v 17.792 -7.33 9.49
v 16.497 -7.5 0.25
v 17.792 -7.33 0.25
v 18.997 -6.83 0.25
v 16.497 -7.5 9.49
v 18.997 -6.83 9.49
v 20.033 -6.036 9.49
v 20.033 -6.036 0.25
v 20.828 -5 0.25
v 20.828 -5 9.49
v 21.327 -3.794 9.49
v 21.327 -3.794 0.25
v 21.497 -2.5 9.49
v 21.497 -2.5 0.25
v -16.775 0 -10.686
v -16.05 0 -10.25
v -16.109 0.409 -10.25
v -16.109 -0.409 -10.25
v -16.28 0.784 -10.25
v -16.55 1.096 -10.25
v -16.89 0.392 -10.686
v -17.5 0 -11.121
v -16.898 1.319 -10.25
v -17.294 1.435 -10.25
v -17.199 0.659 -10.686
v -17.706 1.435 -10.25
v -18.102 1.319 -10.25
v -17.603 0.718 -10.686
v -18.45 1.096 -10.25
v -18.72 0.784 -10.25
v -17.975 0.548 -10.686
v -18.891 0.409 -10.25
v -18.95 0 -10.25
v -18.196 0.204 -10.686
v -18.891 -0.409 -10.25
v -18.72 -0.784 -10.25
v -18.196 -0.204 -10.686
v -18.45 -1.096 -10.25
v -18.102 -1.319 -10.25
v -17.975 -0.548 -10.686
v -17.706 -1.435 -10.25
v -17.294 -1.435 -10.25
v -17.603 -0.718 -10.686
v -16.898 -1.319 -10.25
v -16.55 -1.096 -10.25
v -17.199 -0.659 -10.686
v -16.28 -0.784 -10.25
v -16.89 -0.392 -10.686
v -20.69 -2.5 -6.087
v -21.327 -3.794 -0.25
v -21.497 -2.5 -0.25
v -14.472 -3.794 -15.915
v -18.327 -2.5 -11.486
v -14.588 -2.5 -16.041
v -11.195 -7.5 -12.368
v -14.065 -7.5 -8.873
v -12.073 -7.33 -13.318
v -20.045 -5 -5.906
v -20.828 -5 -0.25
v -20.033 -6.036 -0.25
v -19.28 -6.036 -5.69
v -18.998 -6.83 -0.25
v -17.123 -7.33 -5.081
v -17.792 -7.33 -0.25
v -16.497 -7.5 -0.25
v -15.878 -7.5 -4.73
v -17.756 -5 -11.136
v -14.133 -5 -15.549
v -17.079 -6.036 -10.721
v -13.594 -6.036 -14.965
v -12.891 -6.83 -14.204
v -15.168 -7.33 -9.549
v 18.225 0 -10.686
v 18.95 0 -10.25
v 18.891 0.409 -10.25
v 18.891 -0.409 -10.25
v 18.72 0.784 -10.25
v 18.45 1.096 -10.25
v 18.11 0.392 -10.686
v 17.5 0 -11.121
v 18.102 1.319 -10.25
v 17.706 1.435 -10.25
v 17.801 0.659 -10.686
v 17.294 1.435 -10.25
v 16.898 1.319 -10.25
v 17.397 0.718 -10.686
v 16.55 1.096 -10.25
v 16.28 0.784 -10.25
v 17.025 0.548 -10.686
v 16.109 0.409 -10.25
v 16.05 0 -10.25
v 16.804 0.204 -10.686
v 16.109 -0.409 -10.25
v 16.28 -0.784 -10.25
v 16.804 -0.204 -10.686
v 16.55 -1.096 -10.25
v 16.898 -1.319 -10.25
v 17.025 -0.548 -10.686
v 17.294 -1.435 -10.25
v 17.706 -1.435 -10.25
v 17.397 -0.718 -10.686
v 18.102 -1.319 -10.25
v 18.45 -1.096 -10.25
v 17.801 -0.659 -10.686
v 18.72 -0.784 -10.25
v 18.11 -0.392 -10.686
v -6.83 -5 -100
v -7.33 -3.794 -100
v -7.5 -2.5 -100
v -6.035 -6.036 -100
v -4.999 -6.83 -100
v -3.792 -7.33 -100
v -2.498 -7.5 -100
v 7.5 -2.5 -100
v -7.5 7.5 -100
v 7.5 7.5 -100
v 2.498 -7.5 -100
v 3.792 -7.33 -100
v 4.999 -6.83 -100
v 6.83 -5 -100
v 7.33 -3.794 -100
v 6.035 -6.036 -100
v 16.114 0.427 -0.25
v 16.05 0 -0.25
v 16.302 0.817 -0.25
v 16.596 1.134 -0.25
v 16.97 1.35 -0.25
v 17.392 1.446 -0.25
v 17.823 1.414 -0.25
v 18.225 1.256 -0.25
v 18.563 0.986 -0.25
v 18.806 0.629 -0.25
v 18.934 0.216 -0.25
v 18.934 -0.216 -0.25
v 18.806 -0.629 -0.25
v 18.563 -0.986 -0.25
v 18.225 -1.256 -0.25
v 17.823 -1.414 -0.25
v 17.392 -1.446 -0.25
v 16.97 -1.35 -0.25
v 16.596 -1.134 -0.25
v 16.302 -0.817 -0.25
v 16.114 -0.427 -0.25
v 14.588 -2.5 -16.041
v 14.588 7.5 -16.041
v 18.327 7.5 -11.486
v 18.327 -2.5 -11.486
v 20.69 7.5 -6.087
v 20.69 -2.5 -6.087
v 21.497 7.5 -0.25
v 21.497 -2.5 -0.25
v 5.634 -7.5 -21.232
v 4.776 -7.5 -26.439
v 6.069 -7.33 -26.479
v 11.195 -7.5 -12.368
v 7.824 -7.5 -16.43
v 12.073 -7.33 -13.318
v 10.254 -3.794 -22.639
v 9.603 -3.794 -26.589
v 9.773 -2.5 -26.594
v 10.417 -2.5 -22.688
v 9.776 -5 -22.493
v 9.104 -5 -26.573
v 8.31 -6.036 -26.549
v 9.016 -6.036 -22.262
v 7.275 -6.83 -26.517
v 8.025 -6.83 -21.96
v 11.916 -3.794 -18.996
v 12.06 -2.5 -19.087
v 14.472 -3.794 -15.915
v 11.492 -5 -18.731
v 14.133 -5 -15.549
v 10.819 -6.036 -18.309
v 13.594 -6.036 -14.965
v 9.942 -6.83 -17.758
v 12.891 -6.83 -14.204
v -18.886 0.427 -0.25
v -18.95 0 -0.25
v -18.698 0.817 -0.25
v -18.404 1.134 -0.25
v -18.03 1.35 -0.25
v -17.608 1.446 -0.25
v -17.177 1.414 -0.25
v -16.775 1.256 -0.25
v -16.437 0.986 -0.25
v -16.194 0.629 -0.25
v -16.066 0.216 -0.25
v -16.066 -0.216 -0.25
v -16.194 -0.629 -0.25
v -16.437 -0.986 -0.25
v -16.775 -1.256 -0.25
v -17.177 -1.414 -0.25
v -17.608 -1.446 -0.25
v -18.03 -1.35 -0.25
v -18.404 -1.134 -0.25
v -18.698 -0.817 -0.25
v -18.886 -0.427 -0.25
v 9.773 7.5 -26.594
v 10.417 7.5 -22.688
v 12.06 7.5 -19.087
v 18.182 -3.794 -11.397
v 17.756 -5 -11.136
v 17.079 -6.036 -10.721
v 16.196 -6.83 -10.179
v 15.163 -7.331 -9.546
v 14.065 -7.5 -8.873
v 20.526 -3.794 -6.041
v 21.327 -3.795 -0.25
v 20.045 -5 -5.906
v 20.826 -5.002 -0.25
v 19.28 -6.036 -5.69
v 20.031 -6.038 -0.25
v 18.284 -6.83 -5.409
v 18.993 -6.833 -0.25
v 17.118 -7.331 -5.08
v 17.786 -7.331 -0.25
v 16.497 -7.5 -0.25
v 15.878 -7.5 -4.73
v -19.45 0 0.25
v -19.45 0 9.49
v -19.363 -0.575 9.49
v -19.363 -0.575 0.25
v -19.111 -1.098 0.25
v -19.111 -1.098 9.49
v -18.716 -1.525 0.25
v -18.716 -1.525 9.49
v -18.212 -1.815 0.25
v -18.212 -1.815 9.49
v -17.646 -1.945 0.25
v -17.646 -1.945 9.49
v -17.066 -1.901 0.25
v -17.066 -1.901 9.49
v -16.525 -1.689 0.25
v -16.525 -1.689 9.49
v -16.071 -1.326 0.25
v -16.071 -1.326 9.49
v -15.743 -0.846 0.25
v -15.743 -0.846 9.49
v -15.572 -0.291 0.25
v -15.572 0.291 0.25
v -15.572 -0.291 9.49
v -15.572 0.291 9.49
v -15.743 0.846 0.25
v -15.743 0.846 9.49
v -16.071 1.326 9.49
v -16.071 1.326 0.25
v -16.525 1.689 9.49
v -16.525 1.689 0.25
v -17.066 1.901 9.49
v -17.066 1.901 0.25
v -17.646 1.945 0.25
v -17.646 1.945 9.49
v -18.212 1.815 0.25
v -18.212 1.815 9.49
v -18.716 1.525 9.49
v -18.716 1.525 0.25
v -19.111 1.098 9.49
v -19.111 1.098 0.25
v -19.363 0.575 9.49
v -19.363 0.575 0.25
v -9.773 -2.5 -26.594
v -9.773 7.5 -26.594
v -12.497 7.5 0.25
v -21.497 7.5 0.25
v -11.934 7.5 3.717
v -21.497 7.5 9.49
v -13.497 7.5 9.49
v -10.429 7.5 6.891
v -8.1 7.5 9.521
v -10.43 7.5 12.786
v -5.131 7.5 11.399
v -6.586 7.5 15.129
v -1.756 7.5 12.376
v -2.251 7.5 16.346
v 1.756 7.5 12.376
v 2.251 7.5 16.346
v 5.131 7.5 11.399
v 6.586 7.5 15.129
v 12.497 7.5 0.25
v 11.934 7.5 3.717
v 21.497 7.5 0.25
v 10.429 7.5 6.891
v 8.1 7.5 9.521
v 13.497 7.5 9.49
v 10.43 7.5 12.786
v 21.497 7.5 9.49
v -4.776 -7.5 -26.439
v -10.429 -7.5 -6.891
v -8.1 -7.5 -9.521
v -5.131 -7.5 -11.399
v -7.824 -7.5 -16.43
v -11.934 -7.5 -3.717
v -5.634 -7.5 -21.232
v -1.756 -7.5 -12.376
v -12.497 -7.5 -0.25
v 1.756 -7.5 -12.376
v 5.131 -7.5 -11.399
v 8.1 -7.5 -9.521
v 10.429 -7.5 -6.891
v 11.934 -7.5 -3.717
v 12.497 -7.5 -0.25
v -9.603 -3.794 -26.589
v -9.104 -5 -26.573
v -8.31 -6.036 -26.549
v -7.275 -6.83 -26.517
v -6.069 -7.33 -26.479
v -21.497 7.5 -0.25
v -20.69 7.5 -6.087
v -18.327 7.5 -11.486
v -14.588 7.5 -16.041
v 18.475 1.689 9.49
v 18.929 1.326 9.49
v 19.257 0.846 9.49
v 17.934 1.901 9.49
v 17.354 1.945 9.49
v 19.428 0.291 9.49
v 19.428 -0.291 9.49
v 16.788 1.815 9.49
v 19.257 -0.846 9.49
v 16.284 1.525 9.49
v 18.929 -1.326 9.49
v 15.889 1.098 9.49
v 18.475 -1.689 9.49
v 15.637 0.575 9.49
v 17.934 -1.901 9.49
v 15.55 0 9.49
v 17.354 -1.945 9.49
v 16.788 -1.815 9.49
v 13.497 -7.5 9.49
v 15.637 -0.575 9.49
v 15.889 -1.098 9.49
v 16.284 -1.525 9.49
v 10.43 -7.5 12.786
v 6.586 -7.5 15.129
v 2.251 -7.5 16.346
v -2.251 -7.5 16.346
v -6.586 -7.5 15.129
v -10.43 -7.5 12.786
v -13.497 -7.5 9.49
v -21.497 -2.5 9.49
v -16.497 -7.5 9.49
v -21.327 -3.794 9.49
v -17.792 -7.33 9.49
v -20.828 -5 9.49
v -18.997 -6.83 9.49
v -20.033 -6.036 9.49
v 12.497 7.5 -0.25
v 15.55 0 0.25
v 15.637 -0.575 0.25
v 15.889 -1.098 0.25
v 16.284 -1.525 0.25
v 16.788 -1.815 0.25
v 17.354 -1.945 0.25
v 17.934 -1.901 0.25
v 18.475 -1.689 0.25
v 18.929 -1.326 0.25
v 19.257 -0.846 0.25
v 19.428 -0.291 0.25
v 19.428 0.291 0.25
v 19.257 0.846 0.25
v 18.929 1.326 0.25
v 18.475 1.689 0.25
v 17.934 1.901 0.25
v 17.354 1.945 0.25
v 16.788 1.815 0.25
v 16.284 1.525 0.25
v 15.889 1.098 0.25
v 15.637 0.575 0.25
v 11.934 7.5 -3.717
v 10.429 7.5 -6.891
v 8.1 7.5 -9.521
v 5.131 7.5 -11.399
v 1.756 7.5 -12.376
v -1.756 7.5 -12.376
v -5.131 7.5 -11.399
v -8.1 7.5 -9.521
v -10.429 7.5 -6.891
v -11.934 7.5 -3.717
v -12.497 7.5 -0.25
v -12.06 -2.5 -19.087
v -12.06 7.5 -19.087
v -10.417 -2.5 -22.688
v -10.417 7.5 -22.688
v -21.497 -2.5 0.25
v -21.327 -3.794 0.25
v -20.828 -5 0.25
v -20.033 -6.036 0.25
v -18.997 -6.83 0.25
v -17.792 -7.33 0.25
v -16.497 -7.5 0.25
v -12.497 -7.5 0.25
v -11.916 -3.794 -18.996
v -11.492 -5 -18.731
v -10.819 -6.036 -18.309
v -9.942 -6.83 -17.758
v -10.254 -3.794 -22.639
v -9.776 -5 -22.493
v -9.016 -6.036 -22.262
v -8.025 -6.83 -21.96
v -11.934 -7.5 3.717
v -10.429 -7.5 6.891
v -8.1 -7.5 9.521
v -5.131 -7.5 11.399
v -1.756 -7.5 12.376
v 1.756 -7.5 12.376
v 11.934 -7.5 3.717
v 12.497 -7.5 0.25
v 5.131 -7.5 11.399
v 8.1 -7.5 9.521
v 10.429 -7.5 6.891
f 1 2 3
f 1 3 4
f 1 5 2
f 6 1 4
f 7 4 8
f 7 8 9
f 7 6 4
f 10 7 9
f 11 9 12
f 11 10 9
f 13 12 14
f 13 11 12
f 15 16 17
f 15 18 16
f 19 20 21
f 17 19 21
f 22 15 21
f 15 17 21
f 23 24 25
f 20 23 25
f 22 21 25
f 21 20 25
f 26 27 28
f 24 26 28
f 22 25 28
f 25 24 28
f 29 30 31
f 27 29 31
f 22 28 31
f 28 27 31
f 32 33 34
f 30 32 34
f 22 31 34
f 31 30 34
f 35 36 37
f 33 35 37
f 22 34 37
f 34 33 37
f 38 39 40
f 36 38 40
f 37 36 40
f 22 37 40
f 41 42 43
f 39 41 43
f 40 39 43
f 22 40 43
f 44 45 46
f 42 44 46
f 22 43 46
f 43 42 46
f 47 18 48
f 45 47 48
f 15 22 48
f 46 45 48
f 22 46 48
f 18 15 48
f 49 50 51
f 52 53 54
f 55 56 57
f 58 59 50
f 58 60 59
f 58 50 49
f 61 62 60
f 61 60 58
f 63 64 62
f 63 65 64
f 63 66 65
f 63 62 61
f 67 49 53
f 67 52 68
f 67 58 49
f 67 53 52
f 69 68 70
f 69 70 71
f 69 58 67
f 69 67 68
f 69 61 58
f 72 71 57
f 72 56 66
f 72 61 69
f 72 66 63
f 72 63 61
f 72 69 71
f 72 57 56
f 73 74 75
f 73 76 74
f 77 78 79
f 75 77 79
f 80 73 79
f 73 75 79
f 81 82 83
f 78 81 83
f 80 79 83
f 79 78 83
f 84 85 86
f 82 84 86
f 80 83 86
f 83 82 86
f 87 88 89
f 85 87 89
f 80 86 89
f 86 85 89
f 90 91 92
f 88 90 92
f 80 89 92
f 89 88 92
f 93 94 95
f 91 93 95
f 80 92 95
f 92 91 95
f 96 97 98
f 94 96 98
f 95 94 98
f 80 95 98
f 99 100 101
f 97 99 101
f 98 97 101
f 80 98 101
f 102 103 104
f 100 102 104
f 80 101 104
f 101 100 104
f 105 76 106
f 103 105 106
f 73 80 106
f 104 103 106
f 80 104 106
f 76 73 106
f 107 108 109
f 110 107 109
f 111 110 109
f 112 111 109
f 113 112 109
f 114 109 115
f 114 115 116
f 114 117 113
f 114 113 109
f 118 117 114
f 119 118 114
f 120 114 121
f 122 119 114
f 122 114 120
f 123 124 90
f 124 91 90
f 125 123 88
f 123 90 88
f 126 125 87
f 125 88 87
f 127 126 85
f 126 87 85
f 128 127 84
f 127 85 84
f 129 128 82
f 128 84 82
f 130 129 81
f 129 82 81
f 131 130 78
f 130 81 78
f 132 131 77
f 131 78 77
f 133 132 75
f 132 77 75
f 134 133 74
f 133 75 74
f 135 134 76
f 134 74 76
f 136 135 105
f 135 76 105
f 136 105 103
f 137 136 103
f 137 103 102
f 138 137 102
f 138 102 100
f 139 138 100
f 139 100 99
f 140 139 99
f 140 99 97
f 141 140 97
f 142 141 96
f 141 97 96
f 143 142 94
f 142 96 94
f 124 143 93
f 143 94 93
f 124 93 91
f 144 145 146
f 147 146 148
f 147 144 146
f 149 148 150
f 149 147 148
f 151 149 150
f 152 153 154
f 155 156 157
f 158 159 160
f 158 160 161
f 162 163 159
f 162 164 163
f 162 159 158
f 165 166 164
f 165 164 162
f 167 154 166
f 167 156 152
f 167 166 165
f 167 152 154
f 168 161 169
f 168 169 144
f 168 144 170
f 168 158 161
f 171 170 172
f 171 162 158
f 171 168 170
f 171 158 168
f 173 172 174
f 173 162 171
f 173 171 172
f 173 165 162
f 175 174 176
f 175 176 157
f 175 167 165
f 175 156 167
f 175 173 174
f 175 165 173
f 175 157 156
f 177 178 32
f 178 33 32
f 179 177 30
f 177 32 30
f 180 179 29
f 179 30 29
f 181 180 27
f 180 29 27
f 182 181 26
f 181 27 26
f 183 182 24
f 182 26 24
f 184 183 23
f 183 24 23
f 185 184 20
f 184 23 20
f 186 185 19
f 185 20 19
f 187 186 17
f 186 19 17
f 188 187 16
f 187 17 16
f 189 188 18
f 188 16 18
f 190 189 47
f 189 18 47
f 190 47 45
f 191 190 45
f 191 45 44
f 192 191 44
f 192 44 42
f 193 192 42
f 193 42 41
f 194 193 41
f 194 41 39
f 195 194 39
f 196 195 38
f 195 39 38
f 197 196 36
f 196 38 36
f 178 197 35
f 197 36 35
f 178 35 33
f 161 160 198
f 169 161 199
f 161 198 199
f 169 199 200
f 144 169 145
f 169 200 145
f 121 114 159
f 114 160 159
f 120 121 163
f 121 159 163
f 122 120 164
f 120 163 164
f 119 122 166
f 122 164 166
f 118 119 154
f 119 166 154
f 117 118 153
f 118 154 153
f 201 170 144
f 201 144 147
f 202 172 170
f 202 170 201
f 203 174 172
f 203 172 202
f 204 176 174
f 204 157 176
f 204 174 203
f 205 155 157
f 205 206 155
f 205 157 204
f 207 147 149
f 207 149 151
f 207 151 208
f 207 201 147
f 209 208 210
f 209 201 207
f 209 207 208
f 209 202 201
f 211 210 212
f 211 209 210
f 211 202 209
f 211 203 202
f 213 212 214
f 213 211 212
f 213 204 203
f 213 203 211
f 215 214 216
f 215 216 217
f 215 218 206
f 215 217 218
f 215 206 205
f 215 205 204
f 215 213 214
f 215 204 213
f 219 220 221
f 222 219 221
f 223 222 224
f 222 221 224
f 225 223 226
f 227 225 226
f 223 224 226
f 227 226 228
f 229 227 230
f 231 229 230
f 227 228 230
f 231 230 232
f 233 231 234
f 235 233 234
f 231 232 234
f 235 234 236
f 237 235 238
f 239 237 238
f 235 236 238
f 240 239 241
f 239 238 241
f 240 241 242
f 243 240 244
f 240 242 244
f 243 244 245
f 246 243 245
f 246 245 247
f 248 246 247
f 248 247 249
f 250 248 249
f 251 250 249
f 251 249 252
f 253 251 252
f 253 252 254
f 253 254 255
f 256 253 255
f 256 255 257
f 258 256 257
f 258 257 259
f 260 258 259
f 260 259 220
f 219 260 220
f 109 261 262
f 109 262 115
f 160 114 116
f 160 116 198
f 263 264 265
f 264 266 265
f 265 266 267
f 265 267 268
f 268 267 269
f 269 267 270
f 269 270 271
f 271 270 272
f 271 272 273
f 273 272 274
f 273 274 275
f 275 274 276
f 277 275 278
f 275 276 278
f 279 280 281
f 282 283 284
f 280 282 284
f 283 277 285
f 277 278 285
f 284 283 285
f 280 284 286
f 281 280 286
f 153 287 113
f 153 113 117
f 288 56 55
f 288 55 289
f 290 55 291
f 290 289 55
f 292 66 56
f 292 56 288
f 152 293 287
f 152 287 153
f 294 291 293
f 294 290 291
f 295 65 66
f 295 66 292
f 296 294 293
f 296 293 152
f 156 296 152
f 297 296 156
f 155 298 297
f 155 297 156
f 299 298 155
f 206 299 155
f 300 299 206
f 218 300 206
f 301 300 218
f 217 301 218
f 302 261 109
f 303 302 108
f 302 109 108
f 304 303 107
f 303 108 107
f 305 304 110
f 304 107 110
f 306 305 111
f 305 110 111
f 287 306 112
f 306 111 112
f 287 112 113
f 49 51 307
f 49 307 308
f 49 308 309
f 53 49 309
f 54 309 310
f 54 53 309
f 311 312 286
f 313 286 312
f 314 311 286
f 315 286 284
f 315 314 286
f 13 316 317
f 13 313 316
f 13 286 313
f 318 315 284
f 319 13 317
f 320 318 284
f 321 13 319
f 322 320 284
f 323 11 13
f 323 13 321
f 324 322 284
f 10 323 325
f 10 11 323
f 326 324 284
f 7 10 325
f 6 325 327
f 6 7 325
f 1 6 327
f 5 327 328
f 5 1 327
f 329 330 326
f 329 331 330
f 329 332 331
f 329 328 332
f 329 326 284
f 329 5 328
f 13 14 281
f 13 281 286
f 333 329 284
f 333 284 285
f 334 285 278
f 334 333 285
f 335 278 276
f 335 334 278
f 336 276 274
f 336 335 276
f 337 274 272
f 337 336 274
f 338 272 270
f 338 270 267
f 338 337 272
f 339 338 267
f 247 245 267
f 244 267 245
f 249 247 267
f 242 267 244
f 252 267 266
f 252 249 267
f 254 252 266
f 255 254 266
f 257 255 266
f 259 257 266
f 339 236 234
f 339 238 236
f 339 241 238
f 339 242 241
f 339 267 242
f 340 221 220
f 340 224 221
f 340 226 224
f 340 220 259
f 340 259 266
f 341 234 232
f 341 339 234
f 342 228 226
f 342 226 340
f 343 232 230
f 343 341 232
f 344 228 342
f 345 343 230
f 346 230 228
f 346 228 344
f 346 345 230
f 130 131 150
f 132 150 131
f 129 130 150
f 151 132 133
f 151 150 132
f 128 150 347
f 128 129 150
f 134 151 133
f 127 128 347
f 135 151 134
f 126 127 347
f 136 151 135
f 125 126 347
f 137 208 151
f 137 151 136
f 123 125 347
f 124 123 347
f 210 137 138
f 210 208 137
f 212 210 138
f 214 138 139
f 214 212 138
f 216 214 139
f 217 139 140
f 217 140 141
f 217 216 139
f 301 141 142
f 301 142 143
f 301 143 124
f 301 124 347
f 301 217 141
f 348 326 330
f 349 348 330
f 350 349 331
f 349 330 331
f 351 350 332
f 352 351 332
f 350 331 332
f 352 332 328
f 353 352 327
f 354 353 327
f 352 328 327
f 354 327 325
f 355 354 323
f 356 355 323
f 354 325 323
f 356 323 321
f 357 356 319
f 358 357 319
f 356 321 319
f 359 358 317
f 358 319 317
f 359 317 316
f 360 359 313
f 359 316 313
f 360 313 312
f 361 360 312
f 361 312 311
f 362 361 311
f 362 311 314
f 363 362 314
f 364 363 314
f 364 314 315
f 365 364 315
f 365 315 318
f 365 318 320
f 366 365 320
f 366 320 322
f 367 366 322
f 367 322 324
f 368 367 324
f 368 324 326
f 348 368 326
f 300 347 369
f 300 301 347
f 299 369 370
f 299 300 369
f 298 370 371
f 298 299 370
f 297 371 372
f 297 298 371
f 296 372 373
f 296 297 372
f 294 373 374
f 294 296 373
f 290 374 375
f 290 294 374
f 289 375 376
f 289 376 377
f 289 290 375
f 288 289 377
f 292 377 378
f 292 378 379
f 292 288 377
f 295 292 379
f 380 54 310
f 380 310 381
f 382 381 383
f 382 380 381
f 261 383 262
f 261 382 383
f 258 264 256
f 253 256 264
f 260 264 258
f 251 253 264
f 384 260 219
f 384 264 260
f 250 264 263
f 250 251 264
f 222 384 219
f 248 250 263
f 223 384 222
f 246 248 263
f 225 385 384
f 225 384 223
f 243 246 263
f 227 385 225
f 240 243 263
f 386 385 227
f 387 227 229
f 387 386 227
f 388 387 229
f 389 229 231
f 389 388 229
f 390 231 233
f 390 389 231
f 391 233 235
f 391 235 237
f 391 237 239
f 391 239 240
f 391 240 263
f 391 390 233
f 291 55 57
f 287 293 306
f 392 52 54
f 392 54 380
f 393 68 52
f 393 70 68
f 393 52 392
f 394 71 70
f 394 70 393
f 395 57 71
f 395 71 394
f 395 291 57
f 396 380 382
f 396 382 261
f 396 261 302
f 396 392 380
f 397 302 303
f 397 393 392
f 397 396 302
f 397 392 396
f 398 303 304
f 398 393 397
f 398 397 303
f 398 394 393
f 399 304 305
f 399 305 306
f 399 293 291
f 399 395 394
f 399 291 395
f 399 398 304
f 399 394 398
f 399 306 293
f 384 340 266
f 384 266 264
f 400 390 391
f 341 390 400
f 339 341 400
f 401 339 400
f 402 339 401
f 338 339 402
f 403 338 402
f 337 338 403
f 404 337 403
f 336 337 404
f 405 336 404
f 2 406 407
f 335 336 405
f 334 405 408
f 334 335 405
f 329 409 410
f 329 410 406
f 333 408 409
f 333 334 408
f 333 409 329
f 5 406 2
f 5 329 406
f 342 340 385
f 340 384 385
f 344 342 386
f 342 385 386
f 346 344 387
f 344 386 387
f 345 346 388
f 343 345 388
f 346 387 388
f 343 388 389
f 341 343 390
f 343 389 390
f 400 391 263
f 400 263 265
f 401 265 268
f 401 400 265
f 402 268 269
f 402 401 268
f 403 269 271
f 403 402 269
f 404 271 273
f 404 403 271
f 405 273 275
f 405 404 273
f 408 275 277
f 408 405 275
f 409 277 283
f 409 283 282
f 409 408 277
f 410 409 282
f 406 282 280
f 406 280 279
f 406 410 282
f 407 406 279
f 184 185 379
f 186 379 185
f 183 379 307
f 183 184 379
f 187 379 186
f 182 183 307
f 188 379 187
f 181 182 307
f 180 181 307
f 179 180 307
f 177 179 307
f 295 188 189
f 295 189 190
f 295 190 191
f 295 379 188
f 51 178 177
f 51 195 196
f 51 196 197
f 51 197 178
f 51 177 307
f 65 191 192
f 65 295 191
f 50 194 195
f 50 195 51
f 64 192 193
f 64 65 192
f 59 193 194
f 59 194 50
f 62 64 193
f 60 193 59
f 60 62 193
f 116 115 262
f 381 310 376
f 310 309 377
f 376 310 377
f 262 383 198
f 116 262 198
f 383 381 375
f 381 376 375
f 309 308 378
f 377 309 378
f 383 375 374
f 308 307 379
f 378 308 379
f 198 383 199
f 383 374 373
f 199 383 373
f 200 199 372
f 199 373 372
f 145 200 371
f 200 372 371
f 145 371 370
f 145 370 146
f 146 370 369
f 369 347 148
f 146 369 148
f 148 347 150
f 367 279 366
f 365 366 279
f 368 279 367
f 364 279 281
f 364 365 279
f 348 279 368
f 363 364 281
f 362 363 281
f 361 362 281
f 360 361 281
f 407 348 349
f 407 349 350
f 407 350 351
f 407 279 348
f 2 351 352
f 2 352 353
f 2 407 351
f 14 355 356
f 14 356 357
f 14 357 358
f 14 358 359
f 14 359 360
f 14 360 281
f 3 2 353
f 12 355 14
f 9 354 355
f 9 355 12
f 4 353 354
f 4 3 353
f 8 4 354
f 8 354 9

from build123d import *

# Parameters (mm, degrees)
F1_DEPTH = 7.5
F3_D     = 2.9
F3_DEPTH = 10
F3_TIP   = 0.8712478976
F4_R     = 15
F5_R     = 5
F7_DEPTH = 7.5
F8_D     = 3.9
F9_R     = 5


with BuildPart() as f1:
    # F0 (on Front) → F1 (new body, symmetric)
    with BuildSketch(Plane.XZ):
        with BuildLine():
            ThreePointArc((12.4974997499, -0.25), (0, -12.5), (-12.4974997499, -0.25))
            Line((-12.4974997499, -0.25), (-21.4974997499, -0.25))
            ThreePointArc((-21.4974997499, -0.25), (-18.3999659374, -11.3668227925), (-10, -19.2800419206))
            Line((-10, -19.2800419206), (-7.5, -100))
            Line((-7.5, -100), (7.5, -100))
            Line((7.5, -100), (10, -19.2800419206))
            ThreePointArc((10, -19.2800419206), (18.3999659374, -11.3668227925), (21.4974997499, -0.25))
            Line((21.4974997499, -0.25), (12.4974997499, -0.25))
        make_face()
    extrude(amount=F1_DEPTH, both=True)

    # F3
    with Locations(Plane.XY.offset(-0.25)):
        with Locations((-17.5, 0), (17.5, 0)):
            Hole(F3_D / 2, depth=F3_DEPTH)
            with Locations((0, 0, -(F3_DEPTH + F3_TIP / 2))):  # 118° drill point
                Cone(0, F3_D / 2, F3_TIP, mode=Mode.SUBTRACT)

    # F4
    f4_edges = [f1.edges().sort_by_distance(p)[0] for p in [
        (-10, 0, -19.280042),
        (10, 0, -19.280042),
    ]]
    fillet(f4_edges, radius=F4_R)

    # F5
    f5_edges = [f1.edges().sort_by_distance(p)[0] for p in [
        (-8.636735, -7.5, -63.297106),
        (8.636735, -7.5, -63.297106),
    ]]
    fillet(f5_edges, radius=F5_R)


with BuildPart() as f7:
    # F6 (on Front) → F7 (new body, symmetric)
    with BuildSketch(Plane.XZ):
        with BuildLine():
            Line((-21.4974997499, 0.25), (-12.4974997499, 0.25))
            ThreePointArc((-12.4974997499, 0.25), (0, 12.5), (12.4974997499, 0.25))
            Line((12.4974997499, 0.25), (21.4974997499, 0.25))
            Line((21.4974997499, 0.25), (21.4974997499, 9.4903899024))
            Line((21.4974997499, 9.4903899024), (13.4974997499, 9.4903899024))
            ThreePointArc((13.4974997499, 9.4903899024), (0, 16.5), (-13.4974997499, 9.4903899024))
            Line((-13.4974997499, 9.4903899024), (-21.4974997499, 9.4903899024))
            Line((-21.4974997499, 9.4903899024), (-21.4974997499, 0.25))
        make_face()
    extrude(amount=F7_DEPTH, both=True)

    # F8 (through all)
    with Locations(Plane(origin=(0, 0, -0.25), x_dir=(1, 0, 0), z_dir=(0, 0, -1))):
        with Locations((-17.5, 0), (17.5, 0)):
            Hole(F8_D / 2)

    # F9
    f9_edges = [f7.edges().sort_by_distance(p)[0] for p in [
        (-21.4975, -7.5, 4.870195),
        (21.4975, -7.5, 4.870195),
    ]]
    fillet(f9_edges, radius=F9_R)


solid = Compound([f1.part, f7.part])
